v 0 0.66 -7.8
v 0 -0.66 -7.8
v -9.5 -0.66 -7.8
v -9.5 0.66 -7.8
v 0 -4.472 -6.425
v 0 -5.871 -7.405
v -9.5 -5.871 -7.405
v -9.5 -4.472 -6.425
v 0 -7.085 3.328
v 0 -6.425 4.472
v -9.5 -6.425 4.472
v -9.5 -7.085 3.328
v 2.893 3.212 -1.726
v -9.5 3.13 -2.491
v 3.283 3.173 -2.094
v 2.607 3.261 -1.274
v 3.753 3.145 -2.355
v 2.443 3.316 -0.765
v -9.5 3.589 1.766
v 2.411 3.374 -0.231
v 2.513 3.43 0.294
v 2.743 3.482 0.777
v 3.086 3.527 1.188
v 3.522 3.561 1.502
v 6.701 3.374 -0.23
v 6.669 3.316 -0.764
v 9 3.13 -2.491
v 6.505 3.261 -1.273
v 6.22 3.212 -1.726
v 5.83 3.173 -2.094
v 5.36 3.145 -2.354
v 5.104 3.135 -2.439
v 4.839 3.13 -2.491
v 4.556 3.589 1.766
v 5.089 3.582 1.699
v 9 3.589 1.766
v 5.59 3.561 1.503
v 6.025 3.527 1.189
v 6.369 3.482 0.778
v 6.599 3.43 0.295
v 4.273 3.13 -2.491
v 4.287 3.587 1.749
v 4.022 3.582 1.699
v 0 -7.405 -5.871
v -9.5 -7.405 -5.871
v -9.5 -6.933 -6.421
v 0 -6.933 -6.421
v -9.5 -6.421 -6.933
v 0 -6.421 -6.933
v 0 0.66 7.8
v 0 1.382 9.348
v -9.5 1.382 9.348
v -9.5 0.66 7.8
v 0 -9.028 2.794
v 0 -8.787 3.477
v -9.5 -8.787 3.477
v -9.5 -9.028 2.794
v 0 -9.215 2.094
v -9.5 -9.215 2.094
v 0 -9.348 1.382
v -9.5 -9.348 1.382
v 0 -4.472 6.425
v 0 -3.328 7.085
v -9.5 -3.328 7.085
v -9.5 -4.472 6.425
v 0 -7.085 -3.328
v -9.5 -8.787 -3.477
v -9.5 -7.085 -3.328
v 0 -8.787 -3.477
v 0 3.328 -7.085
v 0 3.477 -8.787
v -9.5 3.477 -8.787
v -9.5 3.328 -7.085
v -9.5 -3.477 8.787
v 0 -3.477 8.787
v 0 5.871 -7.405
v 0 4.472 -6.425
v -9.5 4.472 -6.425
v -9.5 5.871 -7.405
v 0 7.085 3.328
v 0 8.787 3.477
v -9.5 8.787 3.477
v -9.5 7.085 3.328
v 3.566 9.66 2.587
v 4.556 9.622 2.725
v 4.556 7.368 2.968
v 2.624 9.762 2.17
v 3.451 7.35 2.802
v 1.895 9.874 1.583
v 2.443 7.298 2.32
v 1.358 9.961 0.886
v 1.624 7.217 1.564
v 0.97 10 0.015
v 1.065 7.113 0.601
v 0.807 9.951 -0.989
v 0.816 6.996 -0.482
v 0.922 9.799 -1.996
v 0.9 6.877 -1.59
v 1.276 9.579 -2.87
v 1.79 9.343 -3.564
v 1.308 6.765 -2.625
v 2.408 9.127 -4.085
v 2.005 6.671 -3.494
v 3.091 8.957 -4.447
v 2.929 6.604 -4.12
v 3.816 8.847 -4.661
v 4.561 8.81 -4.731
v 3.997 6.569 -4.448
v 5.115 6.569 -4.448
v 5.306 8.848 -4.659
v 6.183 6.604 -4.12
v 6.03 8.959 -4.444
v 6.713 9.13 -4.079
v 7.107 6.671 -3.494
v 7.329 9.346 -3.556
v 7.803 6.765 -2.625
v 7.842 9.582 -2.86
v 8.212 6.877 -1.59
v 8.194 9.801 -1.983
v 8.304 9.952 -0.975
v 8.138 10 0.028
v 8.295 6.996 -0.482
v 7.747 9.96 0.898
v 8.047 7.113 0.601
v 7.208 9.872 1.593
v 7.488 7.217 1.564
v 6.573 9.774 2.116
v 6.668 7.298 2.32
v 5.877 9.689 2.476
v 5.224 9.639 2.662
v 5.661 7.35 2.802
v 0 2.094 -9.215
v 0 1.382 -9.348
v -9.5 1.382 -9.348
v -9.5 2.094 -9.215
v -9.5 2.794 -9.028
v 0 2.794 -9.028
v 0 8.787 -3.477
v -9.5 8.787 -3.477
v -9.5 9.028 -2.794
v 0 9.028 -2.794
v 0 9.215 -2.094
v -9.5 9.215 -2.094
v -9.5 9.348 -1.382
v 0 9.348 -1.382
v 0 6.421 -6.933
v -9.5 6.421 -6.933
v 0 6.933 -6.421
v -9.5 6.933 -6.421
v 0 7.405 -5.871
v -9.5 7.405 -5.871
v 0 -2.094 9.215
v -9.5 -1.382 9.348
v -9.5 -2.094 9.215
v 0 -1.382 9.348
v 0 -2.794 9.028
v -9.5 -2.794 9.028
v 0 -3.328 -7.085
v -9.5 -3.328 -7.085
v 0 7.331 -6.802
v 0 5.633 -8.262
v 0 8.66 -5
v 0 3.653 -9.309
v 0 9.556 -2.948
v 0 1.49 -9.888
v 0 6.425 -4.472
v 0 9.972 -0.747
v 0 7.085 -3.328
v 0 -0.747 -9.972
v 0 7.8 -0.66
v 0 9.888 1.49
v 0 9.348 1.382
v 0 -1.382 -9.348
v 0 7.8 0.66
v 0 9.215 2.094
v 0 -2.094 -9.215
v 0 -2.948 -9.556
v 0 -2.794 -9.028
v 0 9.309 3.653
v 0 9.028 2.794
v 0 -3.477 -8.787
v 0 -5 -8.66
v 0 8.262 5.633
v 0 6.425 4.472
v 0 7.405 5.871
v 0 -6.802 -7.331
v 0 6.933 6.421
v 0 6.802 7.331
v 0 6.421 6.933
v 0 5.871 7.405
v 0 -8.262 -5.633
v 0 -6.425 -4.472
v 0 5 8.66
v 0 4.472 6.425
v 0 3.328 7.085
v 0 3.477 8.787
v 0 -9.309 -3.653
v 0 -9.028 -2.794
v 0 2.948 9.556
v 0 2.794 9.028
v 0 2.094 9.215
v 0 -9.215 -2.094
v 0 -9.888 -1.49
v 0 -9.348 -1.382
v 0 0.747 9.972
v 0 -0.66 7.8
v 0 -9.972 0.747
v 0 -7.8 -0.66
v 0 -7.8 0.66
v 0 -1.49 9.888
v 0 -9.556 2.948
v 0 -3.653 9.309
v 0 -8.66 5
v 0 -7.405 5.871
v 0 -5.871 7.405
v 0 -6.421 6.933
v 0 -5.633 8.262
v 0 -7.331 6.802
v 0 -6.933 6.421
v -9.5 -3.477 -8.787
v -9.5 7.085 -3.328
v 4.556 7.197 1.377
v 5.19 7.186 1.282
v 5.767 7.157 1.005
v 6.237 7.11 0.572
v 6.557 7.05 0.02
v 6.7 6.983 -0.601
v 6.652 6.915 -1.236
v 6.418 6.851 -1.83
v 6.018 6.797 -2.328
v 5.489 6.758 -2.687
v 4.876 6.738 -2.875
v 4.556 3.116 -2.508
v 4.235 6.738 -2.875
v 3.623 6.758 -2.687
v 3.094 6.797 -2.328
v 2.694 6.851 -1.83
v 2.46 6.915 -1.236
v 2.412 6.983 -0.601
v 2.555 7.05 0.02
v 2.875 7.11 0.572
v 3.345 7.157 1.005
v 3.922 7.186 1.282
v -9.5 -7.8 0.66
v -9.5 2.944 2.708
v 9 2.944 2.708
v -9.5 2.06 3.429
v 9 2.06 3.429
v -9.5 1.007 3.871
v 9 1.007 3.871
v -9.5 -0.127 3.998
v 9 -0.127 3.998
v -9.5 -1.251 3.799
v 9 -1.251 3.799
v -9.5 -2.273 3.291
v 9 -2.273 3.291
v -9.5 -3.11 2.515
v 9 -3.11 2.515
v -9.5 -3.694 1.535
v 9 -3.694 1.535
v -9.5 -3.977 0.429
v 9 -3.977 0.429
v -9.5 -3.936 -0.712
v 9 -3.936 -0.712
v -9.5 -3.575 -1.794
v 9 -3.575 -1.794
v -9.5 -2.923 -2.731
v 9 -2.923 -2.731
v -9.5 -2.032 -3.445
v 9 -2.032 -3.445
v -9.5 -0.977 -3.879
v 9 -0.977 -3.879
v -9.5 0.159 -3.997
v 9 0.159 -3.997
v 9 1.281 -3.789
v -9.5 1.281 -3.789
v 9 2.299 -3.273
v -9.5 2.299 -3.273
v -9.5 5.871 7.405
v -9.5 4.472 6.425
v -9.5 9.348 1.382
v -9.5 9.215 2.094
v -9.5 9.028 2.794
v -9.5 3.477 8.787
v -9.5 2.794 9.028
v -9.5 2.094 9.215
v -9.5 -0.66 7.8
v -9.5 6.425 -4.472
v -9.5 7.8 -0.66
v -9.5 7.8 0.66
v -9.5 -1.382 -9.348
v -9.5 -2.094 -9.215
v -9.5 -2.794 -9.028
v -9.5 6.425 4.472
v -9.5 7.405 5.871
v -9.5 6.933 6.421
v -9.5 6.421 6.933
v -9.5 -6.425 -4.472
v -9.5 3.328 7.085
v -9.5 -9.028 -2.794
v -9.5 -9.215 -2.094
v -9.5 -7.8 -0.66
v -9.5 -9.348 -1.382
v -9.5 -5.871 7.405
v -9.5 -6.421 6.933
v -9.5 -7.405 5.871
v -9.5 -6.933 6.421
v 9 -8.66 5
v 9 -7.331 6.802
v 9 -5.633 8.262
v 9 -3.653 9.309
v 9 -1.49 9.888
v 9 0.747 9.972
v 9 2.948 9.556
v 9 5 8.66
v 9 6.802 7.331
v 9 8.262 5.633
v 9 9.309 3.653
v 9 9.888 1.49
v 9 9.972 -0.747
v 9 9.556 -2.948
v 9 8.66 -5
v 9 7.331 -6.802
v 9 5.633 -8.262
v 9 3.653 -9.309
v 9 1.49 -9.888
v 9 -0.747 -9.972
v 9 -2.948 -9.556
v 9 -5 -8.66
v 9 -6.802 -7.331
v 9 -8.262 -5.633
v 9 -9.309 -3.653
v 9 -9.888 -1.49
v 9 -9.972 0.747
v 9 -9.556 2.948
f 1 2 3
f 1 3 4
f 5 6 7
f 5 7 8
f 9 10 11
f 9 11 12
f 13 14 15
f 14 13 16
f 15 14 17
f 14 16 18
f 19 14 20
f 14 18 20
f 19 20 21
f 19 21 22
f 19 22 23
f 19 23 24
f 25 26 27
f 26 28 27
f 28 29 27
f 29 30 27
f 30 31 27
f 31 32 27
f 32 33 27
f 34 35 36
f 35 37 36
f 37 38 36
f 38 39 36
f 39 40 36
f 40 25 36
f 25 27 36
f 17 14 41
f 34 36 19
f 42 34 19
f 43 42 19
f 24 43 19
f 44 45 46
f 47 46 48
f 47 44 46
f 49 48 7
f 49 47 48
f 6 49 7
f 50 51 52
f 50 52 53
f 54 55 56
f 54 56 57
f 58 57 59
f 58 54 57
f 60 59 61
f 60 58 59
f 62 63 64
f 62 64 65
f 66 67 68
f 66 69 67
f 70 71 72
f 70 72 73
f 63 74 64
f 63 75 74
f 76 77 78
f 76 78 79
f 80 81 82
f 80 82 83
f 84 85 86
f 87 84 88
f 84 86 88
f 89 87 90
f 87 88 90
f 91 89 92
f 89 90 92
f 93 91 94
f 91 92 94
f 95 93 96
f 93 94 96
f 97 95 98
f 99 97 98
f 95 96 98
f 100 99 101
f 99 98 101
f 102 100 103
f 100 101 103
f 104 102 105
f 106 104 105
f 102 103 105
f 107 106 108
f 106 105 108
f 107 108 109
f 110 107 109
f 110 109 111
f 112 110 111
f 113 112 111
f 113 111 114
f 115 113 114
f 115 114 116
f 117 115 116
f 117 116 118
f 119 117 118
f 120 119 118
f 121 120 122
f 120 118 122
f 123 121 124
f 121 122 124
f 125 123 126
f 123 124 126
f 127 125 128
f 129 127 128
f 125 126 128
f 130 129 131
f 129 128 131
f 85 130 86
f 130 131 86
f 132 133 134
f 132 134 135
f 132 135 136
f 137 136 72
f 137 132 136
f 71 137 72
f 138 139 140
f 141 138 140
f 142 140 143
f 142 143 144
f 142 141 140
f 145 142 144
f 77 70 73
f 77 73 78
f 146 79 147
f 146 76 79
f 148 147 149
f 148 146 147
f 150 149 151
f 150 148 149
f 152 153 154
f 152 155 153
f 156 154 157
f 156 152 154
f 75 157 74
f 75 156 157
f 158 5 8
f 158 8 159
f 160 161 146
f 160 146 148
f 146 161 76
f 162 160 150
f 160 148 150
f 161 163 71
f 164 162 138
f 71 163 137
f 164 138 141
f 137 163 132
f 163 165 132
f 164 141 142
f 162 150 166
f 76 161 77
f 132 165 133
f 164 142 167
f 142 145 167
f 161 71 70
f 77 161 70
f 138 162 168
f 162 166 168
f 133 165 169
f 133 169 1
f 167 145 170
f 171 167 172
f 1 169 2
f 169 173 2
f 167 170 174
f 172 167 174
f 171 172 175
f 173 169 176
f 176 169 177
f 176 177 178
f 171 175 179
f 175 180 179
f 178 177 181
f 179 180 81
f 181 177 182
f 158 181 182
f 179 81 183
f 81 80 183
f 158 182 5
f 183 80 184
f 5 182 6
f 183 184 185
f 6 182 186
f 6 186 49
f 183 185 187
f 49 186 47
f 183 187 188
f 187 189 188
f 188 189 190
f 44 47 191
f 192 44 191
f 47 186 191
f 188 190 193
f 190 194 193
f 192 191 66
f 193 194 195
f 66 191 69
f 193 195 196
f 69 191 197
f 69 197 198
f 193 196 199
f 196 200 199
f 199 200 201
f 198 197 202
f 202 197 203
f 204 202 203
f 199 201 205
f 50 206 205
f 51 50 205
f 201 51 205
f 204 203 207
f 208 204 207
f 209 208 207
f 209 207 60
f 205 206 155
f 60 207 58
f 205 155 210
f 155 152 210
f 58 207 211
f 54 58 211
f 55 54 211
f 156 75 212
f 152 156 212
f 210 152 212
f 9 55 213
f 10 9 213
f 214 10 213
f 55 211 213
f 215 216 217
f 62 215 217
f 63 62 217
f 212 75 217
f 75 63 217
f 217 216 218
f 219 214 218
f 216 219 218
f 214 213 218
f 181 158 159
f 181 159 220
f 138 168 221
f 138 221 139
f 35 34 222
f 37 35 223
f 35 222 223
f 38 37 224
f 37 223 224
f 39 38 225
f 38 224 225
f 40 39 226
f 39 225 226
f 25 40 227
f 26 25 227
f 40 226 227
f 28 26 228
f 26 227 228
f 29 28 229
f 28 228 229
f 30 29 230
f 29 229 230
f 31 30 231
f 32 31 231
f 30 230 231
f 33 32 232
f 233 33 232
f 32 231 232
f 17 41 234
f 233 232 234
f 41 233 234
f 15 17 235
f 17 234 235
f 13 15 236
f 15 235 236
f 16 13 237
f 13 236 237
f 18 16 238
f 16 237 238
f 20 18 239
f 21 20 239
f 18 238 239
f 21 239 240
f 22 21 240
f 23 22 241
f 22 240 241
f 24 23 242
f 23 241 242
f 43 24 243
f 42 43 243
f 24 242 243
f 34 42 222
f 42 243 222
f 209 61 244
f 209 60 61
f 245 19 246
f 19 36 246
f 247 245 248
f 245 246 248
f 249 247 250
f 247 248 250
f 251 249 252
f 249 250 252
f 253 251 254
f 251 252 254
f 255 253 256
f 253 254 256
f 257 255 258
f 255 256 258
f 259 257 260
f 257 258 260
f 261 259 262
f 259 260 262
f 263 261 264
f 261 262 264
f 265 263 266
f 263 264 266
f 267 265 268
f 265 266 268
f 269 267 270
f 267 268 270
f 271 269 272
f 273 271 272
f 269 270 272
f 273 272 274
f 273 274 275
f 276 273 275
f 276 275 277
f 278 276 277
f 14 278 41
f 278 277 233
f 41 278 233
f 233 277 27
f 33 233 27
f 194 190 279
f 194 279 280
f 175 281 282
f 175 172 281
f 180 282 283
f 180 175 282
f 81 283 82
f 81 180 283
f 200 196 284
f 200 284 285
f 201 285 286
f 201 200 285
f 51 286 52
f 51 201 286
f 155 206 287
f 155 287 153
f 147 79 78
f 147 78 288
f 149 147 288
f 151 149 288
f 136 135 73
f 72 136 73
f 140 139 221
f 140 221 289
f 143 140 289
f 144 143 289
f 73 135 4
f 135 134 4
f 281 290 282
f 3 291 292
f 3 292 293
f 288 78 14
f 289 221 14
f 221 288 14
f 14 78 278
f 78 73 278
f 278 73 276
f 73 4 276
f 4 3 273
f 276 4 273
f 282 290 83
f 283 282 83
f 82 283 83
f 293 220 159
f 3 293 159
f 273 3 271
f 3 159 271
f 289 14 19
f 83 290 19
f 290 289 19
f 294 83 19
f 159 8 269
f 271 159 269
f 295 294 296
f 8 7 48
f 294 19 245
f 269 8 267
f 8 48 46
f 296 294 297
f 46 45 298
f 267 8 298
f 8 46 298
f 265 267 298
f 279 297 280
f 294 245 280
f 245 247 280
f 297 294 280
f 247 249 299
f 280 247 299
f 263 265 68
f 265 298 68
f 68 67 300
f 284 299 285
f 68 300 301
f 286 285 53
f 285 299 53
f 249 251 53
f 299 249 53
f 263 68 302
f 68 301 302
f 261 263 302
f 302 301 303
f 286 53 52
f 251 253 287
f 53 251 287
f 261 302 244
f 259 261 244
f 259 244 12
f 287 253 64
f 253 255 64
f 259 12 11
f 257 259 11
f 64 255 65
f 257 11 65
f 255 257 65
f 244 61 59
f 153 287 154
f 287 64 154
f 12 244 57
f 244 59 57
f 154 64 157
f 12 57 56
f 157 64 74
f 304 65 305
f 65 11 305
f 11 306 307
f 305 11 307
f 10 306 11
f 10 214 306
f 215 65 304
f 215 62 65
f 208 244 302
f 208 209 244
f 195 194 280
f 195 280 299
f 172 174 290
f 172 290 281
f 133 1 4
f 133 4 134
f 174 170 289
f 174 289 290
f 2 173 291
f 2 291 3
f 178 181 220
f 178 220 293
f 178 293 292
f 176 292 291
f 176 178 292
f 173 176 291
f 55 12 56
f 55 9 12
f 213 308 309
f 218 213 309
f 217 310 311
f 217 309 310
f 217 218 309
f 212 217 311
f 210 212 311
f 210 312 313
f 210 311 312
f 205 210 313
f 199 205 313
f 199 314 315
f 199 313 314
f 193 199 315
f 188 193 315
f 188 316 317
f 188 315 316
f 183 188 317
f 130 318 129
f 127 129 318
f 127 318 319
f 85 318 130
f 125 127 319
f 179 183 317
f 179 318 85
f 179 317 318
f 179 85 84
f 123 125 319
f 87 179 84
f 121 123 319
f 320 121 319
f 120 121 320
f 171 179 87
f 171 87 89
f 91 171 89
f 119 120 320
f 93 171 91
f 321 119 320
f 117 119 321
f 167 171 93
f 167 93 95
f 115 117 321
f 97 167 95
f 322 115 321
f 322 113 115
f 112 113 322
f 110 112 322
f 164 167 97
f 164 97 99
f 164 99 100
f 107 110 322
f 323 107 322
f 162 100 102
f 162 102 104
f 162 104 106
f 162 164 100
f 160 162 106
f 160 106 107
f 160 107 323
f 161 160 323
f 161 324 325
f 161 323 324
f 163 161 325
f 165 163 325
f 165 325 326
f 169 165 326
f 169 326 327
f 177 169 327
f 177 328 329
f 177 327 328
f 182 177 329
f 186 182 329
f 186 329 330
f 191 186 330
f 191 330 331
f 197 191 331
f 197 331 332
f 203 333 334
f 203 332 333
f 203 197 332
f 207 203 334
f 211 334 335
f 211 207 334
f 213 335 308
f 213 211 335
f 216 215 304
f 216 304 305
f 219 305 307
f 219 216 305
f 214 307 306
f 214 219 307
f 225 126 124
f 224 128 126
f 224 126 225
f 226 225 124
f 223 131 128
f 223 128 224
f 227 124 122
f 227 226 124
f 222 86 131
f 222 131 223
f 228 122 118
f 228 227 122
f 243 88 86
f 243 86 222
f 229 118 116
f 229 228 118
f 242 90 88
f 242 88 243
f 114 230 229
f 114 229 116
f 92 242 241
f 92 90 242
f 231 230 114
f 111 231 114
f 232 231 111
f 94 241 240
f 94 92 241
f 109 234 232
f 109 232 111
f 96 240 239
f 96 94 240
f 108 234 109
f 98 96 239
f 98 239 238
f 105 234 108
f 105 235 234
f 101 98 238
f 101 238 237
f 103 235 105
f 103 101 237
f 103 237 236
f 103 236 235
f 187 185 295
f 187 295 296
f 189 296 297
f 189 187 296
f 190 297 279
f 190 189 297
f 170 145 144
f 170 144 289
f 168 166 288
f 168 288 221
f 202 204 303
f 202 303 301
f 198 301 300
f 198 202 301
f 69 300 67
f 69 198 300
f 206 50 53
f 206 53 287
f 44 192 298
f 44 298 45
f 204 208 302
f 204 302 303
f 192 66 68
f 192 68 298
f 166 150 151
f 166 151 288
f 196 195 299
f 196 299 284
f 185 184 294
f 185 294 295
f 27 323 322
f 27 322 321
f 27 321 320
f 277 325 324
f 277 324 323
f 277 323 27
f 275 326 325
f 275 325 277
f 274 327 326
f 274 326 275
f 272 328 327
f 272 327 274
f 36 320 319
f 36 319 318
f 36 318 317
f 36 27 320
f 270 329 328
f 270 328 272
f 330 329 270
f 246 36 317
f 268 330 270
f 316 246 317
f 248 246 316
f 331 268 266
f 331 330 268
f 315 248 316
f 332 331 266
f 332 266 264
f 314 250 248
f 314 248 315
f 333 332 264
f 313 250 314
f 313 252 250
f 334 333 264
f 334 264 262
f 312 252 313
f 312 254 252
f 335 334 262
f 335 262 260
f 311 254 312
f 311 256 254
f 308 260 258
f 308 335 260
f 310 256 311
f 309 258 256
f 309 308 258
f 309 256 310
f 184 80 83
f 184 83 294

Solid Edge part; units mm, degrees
sketch "Sketch1" plane through (0, 0, 0) normal (1, 0, 0) x (0, 1, 0)
  circle A0 centre (0, 0) radius 9.45
  dimension "D1" = 18.9
extrude "Protrusion1" add sketch "Sketch1" against normal blind 9.5
sketch "Sketch2" plane through (0, 0, 0) normal (1, 0, 0) x (0, 1, 0)
  circle A0 centre (0, 0) radius 4
extrude "Cutout1" cut sketch "Sketch2" against normal up to next
sketch "Sketch3" plane through (0, 0, 0) normal (1, 0, 0) x (0, 1, 0)
  line L0 (1.382, 9.3484) -> (0.66, 7.8)
  line L1 (0.66, 7.8) -> (-0.66, 7.8)
  line L2 (-0.66, 7.8) -> (-1.382, 9.3484)
  arc A0 (1.382, 9.3484) -> (-1.382, 9.3484) centre (0, 0) ccw
extrude "Cutout2" cut sketch "Sketch3" against normal blind 14000
pattern_circular "Pattern1" count 12 over 360 about axis through (0, 0, 0) along (1, 0, 0) of "Cutout2"
sketch "Sketch4" plane through (0, 0, 0) normal (1, 0, 0) x (0, -0.866, 0.5)
  line L0 (-3.9559, 0.5921) -> (-2.2252, -3.324)
  arc A0 (-2.2252, -3.3239) -> (-3.9559, 0.5921) centre (0, 0) cw
extrude "Protrusion2" add sketch "Sketch4" against normal up to vertex (9.5 mm away)
sketch "Sketch5" plane through (0, 0, 0) normal (1, 0, 0) x (0, -0.866, 0.5)
  line L0 (-3.9559, 0.5921) -> (-2.2252, -3.324)
  arc A0 (-2.2252, -3.3239) -> (-3.9559, 0.5921) centre (0, 0) cw
  circle A1 centre (0, 0) radius 10
  circle A2 centre (0, 0) radius 4
extrude "ExtrudedProtrusion_4" add sketch "Sketch5" along normal blind 9
sketch "Sketch6" plane through (0, 0, 0) normal (1, 0, 0) x (0, -0.866, 0.5)
  line L0 (-3.9559, 0.5921) -> (-2.2252, -3.324)
  arc A0 (-2.2252, -3.3239) -> (-3.9559, 0.5921) centre (0, 0) cw
extrude "Protrusion3" add sketch "Sketch6" along normal up to vertex (9 mm away)
hole "Hole_2" at (4.5559, 9.9488, -1.0824) direction (0, -0.9942, 0.1072) diameter 4.3 end up to next counterbore diameter 7.5 counterbore depth 3
properties material "Steel"
